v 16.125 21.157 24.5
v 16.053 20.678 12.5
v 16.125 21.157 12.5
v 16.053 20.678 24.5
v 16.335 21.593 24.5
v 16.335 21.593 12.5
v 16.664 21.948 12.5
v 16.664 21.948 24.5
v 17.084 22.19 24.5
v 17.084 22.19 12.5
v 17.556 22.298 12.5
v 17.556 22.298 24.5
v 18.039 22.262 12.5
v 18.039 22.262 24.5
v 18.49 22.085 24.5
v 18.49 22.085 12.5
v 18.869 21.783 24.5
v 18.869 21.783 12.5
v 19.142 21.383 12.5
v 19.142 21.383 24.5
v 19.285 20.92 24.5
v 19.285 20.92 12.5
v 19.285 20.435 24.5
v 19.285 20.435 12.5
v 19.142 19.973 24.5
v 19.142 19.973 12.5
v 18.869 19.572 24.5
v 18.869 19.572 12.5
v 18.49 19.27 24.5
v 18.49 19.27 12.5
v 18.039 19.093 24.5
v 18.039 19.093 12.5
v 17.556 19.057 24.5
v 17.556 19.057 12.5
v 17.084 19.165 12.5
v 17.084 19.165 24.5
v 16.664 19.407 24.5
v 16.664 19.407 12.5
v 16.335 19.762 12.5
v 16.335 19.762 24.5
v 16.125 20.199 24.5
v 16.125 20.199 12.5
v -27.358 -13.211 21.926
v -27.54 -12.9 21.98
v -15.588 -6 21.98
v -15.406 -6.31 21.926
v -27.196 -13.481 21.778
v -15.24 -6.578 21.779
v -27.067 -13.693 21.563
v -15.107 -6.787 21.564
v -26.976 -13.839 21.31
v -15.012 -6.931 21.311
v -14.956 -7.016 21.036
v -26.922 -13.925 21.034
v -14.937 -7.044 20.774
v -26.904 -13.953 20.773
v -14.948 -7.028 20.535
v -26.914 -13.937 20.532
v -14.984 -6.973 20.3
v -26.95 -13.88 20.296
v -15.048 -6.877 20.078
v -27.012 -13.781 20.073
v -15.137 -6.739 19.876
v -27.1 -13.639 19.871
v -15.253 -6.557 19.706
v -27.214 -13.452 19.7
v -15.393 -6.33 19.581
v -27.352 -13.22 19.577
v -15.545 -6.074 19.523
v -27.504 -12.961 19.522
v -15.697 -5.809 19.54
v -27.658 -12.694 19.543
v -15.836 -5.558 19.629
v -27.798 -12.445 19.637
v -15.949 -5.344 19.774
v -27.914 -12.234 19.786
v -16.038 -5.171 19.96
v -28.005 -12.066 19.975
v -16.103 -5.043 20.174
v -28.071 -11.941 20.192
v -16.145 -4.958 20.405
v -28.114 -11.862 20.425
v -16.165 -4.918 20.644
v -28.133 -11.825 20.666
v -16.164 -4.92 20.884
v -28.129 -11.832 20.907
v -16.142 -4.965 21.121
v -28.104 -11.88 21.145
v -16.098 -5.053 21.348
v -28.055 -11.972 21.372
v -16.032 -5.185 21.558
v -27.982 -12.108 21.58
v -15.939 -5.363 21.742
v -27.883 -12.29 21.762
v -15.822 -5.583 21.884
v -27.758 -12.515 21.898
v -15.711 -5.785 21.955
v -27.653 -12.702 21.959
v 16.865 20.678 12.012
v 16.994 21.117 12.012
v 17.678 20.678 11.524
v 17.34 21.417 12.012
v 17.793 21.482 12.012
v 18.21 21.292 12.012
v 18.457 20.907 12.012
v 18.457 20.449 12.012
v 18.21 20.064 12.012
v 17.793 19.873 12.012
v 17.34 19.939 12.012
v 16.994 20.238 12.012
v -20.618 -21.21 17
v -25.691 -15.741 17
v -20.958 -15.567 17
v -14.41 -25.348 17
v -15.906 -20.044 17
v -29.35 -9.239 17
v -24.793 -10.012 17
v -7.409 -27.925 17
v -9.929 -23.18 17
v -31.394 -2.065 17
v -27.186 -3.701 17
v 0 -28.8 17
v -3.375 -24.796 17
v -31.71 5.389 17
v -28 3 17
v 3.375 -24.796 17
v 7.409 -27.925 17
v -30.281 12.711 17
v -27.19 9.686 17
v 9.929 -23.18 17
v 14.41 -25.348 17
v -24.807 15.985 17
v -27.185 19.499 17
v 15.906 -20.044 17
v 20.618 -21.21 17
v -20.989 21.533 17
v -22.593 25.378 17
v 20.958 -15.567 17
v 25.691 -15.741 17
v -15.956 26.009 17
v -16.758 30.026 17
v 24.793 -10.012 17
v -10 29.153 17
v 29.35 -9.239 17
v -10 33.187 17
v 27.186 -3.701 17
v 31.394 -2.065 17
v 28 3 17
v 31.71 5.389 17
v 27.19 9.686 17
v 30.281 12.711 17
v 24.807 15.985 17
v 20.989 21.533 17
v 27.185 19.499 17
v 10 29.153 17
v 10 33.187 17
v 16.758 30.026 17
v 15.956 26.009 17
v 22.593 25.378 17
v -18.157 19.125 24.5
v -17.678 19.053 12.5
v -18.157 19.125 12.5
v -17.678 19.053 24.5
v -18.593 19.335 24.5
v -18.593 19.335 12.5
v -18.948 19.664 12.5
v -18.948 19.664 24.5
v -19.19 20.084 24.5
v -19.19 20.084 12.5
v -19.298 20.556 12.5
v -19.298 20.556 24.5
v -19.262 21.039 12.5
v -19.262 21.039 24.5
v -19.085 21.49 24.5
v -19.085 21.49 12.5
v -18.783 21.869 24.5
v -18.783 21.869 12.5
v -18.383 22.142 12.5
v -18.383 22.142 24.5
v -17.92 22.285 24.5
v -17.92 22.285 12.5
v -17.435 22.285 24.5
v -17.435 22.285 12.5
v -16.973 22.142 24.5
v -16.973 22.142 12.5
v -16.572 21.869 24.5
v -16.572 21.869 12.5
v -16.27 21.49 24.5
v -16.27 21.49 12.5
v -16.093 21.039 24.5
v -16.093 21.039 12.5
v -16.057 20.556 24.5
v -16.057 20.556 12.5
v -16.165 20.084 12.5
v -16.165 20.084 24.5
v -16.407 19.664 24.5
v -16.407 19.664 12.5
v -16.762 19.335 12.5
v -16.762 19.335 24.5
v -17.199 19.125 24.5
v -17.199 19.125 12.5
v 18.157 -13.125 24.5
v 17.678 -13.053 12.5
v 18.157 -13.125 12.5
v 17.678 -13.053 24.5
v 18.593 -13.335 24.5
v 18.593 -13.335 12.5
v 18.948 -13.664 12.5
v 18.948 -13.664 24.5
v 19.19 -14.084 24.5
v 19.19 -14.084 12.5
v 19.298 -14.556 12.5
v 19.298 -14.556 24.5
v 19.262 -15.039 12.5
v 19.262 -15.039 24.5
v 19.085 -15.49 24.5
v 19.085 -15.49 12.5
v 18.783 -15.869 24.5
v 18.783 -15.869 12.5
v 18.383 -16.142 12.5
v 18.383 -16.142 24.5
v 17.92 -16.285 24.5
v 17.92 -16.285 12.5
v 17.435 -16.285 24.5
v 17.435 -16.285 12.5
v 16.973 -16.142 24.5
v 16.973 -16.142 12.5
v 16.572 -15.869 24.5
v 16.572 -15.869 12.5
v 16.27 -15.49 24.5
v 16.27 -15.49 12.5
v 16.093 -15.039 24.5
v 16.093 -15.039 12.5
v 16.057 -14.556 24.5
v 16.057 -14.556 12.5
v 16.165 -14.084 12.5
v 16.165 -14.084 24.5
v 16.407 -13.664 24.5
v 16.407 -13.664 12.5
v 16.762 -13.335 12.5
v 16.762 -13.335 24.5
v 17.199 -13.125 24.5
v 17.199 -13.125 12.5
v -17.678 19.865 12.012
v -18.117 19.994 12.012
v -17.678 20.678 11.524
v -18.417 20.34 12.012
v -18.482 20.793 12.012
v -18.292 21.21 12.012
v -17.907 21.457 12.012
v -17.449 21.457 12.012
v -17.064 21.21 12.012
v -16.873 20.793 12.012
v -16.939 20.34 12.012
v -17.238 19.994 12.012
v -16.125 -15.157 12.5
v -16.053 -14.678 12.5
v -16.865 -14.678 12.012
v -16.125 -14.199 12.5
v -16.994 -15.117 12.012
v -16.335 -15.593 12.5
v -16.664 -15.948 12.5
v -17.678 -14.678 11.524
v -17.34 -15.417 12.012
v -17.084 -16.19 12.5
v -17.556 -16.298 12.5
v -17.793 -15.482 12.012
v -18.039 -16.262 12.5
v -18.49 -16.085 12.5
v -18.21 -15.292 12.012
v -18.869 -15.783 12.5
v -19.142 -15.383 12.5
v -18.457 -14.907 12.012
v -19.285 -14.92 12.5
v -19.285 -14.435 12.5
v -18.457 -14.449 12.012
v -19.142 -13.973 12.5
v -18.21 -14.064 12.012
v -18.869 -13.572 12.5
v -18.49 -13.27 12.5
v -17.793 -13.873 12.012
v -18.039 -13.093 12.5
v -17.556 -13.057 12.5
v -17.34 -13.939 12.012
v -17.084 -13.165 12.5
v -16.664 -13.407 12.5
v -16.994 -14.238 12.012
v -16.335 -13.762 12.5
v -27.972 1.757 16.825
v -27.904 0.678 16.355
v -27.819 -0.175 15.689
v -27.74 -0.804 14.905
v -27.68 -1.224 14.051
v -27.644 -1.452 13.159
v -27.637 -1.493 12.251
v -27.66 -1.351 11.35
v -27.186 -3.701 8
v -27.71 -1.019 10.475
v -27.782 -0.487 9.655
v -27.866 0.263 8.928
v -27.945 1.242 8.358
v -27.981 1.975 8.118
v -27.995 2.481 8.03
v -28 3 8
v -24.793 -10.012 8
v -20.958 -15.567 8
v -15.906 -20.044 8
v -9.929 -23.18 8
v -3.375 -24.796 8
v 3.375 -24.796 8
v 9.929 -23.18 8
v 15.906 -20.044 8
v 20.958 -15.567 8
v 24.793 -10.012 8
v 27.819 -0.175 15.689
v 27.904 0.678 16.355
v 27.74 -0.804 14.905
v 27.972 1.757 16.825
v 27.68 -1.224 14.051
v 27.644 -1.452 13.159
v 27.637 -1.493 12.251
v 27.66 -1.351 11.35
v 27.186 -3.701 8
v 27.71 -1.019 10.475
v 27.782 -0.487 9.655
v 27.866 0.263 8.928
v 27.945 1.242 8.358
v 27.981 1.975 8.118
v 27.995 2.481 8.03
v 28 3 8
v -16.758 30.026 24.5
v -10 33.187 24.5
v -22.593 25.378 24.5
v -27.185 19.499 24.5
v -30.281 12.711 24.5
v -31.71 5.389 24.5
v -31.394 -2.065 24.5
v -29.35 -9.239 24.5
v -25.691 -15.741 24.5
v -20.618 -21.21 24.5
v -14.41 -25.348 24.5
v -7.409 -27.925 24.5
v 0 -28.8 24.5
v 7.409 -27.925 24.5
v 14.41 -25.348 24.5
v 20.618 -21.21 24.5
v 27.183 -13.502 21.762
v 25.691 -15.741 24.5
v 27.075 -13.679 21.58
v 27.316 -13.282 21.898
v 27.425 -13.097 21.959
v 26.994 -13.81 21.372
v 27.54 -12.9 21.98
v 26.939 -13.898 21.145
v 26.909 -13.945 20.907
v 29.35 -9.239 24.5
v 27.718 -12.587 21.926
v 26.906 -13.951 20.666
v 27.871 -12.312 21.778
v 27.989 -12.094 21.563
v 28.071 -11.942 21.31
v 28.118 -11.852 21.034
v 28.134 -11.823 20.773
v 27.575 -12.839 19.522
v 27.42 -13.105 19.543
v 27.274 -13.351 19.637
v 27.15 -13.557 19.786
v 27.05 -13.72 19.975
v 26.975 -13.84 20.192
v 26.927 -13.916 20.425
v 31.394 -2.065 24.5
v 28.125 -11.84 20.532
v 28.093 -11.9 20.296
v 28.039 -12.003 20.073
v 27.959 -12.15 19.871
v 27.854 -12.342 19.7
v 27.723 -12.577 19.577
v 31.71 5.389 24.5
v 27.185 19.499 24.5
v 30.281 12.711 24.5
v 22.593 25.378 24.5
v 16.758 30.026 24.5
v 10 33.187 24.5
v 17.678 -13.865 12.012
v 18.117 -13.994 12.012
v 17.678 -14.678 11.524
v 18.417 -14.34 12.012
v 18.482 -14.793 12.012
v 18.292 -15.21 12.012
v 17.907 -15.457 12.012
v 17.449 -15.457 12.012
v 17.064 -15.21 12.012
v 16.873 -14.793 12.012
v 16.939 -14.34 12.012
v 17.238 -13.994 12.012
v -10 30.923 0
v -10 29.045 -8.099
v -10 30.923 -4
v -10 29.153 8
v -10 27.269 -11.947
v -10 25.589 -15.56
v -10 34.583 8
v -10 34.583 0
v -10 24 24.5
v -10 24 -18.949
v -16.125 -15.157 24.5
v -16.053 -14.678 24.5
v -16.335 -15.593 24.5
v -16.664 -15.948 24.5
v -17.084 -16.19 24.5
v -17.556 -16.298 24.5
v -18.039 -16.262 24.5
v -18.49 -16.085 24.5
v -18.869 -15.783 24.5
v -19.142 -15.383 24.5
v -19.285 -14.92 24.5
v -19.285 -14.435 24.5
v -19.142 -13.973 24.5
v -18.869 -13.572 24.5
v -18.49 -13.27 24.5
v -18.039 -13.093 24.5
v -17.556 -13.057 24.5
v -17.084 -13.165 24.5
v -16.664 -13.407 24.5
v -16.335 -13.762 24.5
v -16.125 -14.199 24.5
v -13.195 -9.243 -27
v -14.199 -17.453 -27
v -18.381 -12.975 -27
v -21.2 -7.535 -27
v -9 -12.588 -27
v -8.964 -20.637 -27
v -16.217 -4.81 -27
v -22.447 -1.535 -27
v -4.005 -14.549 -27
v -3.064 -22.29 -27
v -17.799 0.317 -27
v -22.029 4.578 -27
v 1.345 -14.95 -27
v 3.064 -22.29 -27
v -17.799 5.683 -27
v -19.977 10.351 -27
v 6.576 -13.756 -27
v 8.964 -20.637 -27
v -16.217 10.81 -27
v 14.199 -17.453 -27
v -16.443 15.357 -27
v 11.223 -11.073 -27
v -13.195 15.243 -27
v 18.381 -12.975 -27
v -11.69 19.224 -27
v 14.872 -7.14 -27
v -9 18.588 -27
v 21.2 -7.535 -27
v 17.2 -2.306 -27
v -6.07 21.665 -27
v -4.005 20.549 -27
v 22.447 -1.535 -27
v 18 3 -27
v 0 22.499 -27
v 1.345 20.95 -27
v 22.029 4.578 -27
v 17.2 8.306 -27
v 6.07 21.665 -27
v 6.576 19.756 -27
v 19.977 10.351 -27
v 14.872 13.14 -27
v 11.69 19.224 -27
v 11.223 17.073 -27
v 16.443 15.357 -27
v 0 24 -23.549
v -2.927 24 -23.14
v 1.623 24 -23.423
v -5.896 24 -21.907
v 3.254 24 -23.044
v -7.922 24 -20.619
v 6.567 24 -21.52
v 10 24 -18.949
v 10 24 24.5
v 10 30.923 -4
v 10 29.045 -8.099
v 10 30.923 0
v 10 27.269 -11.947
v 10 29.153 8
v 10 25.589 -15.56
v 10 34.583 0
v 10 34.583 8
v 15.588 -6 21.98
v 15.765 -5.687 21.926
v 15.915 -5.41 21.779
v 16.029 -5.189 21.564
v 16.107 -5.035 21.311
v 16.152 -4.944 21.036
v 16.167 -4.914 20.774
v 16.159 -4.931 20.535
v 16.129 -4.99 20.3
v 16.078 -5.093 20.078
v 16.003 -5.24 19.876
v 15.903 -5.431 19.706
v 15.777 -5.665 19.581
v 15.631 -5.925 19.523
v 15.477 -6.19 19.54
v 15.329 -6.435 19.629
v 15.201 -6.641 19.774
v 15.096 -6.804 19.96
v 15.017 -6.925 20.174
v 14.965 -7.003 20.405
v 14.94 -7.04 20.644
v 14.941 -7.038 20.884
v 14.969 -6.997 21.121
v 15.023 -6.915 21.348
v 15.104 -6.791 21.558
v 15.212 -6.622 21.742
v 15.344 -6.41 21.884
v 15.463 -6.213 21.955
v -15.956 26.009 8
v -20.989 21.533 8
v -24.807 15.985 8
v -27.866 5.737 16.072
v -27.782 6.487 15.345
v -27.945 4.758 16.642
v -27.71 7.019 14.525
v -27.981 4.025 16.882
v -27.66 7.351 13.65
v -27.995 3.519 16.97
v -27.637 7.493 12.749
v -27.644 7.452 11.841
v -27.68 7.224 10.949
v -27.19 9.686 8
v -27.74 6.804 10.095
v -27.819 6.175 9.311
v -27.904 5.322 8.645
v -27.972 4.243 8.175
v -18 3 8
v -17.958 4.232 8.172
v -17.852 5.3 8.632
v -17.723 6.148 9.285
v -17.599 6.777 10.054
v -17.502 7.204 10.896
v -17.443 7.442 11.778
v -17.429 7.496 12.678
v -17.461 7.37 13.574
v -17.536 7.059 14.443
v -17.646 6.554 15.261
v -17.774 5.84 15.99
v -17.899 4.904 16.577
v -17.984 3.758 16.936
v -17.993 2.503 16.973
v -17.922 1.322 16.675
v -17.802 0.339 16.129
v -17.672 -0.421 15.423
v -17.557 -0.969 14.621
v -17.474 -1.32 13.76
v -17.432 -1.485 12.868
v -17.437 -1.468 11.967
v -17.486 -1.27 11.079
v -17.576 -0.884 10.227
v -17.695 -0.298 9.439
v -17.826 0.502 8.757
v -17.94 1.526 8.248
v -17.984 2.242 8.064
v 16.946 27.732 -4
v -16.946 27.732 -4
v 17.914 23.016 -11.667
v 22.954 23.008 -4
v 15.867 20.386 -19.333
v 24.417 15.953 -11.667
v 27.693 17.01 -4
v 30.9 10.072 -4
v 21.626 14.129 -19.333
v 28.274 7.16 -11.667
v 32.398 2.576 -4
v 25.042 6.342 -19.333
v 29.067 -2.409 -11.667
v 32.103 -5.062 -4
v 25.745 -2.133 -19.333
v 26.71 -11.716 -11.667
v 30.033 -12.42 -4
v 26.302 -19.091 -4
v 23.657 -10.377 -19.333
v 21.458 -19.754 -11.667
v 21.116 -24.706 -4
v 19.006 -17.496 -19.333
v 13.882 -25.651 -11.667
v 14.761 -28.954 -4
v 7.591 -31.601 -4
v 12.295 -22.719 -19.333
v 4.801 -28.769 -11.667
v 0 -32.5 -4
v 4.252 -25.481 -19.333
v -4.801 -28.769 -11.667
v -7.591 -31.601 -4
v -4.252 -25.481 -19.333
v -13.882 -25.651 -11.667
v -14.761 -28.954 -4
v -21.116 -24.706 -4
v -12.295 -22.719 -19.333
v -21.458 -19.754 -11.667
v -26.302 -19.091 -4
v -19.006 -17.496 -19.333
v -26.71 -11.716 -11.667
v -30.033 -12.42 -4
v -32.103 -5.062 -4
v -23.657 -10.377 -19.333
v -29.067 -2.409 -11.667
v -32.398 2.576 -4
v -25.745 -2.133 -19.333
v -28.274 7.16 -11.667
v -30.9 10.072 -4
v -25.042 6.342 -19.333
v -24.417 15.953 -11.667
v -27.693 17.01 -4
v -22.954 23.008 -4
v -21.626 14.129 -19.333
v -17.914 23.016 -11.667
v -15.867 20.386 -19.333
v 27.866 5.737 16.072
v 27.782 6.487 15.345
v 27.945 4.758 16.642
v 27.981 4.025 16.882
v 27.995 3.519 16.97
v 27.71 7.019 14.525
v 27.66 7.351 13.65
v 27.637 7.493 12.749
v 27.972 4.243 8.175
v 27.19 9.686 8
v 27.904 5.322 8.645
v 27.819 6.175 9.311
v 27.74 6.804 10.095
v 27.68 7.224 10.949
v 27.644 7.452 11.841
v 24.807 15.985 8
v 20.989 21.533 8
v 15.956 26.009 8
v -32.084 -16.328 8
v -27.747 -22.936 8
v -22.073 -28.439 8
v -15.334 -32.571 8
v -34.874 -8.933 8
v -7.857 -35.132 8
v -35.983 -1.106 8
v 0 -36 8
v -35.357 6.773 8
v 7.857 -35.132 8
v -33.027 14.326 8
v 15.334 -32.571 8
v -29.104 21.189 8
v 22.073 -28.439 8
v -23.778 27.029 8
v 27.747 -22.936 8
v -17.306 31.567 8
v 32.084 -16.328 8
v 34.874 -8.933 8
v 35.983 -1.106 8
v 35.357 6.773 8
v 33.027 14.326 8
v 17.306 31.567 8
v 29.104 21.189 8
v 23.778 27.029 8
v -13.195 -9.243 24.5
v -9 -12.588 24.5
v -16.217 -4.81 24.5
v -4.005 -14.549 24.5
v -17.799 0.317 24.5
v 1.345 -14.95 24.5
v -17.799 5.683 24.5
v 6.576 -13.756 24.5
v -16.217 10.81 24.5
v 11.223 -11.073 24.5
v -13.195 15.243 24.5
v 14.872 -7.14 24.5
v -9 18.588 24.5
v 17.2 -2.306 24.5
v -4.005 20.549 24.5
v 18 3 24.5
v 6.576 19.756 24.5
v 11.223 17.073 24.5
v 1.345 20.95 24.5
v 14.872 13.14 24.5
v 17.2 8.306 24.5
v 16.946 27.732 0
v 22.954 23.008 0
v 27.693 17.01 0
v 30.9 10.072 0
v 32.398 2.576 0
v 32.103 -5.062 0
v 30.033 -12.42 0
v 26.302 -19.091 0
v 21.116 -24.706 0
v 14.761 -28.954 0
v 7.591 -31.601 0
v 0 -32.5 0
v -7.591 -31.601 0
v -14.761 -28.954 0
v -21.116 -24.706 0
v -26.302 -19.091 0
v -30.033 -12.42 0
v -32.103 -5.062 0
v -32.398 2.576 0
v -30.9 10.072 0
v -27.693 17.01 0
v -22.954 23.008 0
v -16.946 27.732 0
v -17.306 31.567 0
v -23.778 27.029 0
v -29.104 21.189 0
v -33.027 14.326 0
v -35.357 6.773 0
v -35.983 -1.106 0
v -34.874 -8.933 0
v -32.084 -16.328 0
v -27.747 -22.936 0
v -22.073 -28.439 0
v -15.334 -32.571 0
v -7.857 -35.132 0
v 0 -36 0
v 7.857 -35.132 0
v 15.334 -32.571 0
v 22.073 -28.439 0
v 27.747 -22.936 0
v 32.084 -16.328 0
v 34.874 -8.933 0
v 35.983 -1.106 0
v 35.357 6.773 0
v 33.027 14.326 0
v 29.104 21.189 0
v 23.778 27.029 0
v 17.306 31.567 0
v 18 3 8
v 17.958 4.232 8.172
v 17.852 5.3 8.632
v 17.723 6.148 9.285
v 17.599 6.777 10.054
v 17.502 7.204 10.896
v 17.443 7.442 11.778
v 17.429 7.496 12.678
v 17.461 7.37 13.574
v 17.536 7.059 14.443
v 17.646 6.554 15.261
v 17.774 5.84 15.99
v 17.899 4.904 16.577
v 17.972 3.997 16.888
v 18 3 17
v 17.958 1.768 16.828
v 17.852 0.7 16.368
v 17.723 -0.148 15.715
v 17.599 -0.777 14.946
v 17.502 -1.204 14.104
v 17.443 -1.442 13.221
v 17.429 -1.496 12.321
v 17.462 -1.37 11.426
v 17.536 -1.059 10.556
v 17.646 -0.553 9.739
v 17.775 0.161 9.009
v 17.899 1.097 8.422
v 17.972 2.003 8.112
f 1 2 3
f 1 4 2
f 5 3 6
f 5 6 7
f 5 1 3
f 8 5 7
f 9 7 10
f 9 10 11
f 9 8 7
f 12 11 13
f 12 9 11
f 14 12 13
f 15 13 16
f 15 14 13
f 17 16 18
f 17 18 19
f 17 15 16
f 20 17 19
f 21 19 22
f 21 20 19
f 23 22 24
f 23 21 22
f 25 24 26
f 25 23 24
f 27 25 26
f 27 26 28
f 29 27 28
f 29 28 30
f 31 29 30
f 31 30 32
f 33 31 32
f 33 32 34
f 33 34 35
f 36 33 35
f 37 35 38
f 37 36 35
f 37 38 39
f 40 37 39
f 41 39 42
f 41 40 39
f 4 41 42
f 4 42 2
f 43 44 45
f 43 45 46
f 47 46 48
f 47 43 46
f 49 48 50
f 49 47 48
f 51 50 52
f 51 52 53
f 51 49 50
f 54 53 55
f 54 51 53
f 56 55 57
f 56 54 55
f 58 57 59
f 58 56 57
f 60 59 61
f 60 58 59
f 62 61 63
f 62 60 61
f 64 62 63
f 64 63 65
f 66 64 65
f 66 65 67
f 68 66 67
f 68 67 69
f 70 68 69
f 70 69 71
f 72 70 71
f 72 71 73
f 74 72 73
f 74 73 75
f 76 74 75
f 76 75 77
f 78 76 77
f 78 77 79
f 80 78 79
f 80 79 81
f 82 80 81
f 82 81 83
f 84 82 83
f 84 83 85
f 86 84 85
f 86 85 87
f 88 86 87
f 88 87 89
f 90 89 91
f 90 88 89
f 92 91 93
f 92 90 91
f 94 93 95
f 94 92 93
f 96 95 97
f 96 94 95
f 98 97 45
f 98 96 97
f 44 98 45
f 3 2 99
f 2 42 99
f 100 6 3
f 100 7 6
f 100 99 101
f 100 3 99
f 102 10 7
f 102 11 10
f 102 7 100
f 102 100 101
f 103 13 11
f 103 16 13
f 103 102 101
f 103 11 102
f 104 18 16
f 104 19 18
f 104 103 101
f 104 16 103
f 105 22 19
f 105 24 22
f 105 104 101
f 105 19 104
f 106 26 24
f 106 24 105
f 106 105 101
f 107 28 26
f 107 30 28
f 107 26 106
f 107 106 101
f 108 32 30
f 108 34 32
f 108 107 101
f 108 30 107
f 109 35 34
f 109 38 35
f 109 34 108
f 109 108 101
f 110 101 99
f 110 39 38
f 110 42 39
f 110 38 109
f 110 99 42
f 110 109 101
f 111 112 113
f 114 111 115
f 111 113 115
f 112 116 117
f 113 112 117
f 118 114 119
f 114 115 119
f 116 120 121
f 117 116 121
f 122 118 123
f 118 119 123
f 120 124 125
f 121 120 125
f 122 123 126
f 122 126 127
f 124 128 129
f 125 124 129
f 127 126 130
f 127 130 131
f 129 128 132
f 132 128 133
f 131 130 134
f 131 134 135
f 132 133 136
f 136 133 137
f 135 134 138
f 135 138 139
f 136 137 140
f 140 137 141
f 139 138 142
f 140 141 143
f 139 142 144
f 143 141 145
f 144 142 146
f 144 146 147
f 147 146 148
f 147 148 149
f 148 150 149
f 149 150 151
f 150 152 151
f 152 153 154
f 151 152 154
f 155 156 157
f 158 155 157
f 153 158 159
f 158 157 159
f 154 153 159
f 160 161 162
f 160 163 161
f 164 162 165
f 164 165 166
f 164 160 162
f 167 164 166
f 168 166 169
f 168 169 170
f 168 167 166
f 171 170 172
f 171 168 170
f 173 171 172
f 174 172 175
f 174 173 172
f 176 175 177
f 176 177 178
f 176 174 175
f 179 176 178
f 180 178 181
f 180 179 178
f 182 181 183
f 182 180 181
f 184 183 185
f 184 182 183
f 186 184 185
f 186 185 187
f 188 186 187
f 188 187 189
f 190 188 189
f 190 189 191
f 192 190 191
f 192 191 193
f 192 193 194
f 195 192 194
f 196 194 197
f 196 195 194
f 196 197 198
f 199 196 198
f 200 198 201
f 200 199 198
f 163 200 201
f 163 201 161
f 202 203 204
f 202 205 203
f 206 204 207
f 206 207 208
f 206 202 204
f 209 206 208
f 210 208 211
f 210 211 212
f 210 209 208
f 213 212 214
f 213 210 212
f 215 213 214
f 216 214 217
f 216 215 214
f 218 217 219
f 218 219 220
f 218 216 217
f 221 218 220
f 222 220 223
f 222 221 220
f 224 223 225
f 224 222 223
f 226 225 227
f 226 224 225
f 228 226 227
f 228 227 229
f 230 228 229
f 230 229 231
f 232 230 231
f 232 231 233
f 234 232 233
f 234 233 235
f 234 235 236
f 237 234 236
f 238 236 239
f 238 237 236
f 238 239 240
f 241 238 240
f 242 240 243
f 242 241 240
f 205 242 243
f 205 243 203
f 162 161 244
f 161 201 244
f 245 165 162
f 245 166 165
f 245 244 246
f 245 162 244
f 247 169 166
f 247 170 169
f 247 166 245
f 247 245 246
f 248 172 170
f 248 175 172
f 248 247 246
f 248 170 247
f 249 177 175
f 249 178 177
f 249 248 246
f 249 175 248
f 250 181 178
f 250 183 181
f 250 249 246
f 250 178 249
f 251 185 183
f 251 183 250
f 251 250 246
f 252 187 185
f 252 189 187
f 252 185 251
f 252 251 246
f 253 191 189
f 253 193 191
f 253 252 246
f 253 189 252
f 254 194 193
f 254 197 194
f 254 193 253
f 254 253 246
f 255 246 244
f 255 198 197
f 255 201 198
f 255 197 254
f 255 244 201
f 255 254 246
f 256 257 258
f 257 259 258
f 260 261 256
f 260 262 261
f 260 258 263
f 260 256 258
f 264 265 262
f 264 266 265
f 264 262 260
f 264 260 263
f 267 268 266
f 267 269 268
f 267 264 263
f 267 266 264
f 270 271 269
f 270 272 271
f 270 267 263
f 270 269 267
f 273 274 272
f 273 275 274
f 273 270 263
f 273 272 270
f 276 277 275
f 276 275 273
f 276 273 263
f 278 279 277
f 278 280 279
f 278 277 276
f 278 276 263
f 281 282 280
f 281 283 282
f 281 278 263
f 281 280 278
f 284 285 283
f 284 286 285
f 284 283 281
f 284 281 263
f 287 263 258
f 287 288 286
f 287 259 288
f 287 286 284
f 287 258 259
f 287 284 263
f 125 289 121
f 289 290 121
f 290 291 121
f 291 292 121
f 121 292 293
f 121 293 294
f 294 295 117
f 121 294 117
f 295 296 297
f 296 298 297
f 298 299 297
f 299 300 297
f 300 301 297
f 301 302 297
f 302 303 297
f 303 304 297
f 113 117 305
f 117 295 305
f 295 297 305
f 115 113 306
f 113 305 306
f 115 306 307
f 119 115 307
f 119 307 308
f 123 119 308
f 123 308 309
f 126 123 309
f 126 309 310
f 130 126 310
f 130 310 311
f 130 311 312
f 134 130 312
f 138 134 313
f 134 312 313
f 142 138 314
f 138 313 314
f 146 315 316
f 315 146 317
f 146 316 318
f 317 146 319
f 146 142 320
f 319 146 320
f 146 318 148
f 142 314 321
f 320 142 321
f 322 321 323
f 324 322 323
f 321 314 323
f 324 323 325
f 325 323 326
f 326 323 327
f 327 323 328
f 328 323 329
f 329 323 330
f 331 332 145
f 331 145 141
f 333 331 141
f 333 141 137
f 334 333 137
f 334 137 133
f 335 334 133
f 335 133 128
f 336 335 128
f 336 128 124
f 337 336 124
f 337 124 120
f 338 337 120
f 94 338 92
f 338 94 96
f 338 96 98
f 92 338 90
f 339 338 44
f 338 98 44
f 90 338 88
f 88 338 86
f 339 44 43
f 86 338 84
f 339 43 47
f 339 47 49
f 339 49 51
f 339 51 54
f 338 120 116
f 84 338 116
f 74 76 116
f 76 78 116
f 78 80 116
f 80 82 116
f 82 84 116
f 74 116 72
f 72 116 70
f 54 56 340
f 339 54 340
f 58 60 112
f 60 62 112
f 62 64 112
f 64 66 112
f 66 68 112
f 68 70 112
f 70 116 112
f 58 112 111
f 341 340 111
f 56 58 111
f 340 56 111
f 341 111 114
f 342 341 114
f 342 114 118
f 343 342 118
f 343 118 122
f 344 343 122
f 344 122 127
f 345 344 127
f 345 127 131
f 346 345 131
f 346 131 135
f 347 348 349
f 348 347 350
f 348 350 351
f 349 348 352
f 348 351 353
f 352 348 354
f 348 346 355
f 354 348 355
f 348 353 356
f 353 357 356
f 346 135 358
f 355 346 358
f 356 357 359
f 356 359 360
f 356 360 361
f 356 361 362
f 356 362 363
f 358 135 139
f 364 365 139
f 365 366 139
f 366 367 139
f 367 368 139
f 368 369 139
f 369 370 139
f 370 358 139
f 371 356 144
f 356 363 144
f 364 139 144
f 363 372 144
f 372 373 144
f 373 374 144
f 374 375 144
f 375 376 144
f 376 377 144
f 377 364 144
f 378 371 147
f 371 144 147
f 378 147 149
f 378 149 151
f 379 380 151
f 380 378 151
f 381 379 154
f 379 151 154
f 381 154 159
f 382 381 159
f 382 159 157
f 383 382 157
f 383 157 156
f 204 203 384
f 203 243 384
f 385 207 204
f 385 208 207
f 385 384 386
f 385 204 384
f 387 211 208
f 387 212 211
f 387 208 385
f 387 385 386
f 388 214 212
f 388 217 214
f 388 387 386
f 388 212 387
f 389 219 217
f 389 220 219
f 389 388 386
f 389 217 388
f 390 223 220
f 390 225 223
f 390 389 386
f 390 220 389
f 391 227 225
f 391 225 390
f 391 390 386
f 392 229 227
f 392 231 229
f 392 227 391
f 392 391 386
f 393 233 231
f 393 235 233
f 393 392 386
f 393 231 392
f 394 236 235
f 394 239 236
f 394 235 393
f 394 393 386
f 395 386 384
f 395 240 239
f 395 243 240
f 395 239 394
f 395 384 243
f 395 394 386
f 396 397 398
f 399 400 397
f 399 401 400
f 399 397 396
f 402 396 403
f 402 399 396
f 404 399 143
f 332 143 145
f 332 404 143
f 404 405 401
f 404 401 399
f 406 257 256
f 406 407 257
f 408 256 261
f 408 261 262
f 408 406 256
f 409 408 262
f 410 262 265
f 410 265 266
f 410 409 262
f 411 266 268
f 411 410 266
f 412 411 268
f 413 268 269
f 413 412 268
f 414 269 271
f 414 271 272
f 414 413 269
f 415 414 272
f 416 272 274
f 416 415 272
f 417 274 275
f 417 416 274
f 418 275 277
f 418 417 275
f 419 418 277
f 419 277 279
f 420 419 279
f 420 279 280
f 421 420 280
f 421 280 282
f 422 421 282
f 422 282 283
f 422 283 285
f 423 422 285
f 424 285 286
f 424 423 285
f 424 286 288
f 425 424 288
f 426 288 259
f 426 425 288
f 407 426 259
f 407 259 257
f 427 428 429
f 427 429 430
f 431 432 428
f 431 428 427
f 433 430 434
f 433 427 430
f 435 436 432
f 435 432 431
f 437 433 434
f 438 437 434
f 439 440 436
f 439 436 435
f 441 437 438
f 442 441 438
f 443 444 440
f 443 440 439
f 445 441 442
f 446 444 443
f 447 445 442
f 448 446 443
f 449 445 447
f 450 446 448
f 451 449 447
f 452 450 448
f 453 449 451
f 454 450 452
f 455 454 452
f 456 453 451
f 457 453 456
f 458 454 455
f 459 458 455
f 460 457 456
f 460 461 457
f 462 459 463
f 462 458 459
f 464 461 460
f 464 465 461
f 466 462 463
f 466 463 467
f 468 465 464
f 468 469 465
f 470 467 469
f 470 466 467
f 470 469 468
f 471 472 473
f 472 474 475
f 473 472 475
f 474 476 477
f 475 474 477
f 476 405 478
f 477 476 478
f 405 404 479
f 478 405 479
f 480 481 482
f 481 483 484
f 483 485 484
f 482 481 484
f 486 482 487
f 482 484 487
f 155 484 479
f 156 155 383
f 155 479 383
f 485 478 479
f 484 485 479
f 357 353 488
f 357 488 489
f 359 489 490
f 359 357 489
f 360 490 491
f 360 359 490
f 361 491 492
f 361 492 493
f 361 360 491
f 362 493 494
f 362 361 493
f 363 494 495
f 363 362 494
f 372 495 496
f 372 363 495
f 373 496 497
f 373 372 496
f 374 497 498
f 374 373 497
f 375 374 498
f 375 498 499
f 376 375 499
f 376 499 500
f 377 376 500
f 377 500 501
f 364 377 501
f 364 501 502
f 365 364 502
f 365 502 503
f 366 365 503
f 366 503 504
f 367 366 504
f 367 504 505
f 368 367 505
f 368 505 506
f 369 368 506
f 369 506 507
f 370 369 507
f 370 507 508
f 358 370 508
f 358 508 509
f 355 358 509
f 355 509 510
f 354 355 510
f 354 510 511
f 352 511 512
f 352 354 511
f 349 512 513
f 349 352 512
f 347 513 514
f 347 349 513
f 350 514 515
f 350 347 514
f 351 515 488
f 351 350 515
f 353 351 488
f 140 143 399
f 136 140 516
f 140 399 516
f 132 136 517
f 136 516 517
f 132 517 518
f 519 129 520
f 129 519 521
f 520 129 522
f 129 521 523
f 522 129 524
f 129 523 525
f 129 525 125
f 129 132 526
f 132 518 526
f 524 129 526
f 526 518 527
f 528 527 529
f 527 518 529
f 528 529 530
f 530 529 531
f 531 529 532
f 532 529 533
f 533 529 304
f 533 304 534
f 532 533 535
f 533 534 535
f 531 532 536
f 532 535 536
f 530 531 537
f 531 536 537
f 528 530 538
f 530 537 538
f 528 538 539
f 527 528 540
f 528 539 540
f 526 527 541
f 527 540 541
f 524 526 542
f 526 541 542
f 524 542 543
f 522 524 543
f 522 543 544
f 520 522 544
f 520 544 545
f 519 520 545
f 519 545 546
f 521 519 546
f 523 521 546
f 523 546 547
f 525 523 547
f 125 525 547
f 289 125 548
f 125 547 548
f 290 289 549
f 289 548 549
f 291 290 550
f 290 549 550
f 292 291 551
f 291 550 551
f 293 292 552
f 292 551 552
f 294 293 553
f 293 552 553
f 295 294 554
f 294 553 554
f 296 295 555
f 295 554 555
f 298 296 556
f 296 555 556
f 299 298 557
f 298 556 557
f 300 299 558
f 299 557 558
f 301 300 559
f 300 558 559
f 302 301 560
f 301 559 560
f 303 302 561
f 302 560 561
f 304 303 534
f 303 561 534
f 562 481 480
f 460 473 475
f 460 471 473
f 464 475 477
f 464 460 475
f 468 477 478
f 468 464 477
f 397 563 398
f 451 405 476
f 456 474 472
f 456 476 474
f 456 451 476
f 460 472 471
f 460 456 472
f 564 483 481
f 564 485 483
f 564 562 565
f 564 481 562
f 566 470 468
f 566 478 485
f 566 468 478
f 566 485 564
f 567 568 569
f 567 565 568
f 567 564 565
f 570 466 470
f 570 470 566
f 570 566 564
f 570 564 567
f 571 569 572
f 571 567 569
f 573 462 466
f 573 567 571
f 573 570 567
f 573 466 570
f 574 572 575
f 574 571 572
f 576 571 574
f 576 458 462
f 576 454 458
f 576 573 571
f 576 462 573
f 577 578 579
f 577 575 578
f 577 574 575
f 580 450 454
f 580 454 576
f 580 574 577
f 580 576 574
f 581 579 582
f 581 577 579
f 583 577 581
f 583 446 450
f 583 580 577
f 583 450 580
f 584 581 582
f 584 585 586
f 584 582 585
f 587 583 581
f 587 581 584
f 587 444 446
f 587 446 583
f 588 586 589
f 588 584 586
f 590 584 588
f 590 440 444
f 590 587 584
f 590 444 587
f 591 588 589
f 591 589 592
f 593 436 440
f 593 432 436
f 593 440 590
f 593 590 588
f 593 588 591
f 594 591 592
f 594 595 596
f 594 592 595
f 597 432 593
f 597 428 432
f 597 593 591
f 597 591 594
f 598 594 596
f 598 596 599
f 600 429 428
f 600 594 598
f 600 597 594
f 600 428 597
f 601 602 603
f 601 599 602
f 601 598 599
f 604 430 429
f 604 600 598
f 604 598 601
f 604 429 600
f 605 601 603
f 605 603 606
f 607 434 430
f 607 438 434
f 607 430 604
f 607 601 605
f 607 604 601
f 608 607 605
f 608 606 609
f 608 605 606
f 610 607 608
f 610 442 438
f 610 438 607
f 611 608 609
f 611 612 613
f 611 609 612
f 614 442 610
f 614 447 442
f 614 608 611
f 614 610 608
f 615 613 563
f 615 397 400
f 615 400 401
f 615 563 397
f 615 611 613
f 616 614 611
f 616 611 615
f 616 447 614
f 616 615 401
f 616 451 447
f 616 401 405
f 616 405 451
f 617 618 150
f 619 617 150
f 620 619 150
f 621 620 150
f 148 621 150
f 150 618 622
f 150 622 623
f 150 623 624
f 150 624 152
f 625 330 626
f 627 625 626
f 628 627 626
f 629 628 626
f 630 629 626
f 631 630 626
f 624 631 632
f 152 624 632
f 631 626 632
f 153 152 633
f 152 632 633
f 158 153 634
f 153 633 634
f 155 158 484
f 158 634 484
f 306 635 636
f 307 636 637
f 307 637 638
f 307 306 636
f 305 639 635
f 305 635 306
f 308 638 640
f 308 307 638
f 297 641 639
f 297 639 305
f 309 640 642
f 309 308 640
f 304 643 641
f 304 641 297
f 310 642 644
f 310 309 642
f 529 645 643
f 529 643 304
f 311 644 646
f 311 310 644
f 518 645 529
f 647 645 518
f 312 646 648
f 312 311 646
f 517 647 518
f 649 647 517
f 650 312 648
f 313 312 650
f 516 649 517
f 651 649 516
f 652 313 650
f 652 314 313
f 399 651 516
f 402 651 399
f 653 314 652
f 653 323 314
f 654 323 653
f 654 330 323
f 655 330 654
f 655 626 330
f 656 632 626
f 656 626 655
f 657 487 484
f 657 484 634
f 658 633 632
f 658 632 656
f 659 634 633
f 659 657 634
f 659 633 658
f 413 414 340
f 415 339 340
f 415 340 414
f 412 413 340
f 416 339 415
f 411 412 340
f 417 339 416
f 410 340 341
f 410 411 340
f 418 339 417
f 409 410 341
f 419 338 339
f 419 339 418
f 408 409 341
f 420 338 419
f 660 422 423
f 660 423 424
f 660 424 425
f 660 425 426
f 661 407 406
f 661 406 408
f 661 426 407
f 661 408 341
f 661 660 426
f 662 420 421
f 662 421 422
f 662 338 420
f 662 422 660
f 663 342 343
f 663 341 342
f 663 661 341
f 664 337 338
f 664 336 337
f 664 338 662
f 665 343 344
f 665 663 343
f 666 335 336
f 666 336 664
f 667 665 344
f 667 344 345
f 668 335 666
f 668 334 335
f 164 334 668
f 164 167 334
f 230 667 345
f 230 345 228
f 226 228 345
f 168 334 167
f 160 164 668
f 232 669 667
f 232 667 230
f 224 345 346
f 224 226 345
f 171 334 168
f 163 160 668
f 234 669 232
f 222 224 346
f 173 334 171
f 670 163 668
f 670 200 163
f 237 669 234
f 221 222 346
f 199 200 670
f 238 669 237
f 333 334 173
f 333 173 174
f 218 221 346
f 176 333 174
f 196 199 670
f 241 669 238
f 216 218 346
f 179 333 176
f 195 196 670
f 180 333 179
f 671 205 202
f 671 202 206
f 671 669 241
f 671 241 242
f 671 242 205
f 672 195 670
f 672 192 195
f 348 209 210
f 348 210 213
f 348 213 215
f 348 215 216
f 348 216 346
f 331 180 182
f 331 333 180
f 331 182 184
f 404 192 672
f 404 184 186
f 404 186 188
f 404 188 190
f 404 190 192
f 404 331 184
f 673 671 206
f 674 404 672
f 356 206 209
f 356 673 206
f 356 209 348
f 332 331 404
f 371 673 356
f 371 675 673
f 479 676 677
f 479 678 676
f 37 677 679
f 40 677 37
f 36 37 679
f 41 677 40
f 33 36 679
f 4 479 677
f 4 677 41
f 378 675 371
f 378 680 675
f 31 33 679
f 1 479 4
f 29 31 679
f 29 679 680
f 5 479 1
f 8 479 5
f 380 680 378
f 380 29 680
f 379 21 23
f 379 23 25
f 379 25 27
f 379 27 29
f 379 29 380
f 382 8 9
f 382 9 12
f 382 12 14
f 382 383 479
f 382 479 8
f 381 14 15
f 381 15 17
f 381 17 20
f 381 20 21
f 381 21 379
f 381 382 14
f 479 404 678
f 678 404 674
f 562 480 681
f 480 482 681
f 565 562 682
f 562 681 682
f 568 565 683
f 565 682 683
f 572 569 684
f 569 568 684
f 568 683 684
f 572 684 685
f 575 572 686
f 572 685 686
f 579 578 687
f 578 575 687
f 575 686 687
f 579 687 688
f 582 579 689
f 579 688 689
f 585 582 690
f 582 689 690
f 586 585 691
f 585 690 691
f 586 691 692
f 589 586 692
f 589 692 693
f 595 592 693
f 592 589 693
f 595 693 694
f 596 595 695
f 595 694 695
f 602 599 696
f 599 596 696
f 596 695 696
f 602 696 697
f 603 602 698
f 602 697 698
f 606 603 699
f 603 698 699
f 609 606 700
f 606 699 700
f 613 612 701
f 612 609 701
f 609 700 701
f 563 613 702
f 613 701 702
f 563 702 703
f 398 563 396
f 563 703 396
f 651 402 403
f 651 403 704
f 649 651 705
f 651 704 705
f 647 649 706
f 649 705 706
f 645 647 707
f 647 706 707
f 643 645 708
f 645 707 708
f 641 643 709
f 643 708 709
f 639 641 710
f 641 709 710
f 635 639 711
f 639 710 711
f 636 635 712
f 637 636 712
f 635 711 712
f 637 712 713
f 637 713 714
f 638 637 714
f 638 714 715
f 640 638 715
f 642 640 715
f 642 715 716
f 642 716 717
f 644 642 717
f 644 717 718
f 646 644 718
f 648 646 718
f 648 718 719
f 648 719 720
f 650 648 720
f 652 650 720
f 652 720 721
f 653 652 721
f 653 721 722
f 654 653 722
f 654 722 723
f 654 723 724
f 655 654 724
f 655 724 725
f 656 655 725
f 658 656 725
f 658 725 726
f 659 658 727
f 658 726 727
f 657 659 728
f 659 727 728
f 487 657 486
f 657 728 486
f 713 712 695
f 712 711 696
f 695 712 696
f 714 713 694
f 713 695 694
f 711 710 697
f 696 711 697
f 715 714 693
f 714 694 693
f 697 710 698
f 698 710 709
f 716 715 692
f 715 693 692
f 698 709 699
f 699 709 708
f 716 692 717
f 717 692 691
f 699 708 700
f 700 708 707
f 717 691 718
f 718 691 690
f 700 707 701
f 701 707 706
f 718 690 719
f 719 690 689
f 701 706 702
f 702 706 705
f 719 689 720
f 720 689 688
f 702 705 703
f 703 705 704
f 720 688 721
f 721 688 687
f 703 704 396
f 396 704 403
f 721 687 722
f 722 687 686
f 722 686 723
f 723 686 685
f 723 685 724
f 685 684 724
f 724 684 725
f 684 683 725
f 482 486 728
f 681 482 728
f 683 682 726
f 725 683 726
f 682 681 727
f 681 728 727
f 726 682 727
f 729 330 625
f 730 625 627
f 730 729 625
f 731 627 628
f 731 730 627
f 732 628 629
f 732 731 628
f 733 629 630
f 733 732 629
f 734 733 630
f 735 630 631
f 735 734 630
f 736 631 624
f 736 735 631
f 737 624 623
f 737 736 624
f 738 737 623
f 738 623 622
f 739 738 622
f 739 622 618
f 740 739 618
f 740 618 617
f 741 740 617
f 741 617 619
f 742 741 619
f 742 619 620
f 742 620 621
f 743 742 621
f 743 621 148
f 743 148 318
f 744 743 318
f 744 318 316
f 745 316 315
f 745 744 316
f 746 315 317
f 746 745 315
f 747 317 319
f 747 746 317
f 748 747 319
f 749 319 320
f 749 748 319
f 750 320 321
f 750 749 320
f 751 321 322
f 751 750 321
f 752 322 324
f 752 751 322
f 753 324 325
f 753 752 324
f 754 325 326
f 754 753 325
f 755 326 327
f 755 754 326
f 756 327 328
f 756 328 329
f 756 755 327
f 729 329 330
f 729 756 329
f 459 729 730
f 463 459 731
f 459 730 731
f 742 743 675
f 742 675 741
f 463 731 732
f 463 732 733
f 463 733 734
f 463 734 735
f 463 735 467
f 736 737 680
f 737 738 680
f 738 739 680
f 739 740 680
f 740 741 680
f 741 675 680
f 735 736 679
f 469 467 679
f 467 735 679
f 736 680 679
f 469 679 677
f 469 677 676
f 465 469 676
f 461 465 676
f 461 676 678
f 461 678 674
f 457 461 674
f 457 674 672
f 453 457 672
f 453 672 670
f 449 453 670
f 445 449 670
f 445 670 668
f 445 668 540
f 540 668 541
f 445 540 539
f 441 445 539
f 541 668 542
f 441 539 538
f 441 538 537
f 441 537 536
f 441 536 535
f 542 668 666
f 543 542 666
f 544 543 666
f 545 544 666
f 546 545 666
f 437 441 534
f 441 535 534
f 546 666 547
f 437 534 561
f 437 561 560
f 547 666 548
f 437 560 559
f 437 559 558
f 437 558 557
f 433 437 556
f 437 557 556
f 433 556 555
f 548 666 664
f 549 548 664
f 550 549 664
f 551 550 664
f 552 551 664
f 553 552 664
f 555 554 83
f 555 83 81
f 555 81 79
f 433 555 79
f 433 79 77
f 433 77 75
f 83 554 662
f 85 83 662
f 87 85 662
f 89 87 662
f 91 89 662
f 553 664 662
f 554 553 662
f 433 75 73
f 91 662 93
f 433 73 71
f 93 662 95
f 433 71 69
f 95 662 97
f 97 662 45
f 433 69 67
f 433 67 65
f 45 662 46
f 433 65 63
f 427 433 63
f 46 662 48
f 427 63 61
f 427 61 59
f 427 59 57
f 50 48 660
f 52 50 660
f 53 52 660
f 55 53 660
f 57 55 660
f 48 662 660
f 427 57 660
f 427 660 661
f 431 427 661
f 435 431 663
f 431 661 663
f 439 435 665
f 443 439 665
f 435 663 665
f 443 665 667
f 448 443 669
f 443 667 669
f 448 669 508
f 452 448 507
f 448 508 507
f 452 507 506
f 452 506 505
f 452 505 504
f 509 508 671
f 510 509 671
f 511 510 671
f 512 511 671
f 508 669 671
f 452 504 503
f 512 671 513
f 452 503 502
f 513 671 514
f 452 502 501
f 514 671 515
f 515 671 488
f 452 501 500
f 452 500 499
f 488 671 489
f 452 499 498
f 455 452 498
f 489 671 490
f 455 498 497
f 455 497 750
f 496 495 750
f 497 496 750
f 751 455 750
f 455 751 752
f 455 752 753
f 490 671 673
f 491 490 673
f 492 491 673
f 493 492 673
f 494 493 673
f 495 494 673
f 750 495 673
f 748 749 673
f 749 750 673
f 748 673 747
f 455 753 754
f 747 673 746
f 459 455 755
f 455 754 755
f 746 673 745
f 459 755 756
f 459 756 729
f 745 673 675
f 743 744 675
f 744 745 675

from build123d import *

# Parameters (mm, degrees)
ESQUISSE1_R                  = 36
BASE_EXTRUSION_DEPTH         = 8
ESQUISSE2_R                  = 32.5
BOSS_EXTRU_1_DEPTH           = 4
ESQUISSE4_R                  = 28
BOSS_EXTRU_2_DEPTH           = 9
ESQUISSE5_R                  = 31.8
BOSS_EXTRU_3_DEPTH           = 7.5
ESQUISSE6_R                  = 18
ENL_V_MAT_EXTRU_1_DEPTH      = 52.5
ESQUISSE10_W                 = 20
ESQUISSE10_H                 = 14.61003861
ENL_V_MAT_EXTRU_5_DEPTH      = 52.5
R_P_TITION_CIRCULAIRE1_COUNT = 4
ESQUISSE13_R                 = 4.5
ENL_V_MAT_EXTRU_6_DEPTH      = 37
ENL_V_MAT_EXTRU_6_DEPTH_BACK = 37
ENL_V_START                  = -31.8
ESQUISSE14_R                 = 1.23
ENL_V_MAT_EXTRU_7_DEPTH      = 13.842074
R_P_TITION_CIRCULAIRE2_COUNT = 2
R_P_TITION_CIRCULAIRE2_ANGLE = 120


with BuildPart() as part:
    # Esquisse1 → Base-Extrusion (new body)
    with BuildSketch(Plane.XY):
        Circle(ESQUISSE1_R)
    extrude(amount=BASE_EXTRUSION_DEPTH)

    # Esquisse2 → Boss.-Extru.1 (add)
    with BuildSketch(Plane(origin=(0, 0, 0), x_dir=(-1, 0, 0), z_dir=(0, 0, -1))):
        Circle(ESQUISSE2_R)
    extrude(amount=BOSS_EXTRU_1_DEPTH)

    # Esquisse3 → Boss.-Révol.1 (revolve)
    with BuildSketch(Plane(origin=(0, 0, 0), x_dir=(0, 0, -1), z_dir=(1, 0, 0))):
        Polygon((4, 32.5), (27, 22.499315376), (27, 0), (4, 0), align=None)
    revolve(axis=Axis((0, 0, 0), (0, 0, -1)))

    # Esquisse4 → Boss.-Extru.2 (add)
    with BuildSketch(Plane.XY.offset(8)):
        with Locations((0, 3)):
            Circle(ESQUISSE4_R)
    extrude(amount=BOSS_EXTRU_2_DEPTH)

    # Esquisse5 → Boss.-Extru.3 (add)
    with BuildSketch(Plane.XY.offset(17)):
        with Locations((0, 3)):
            Circle(ESQUISSE5_R)
    extrude(amount=BOSS_EXTRU_3_DEPTH)

    # Esquisse6 → Enlèv. mat.-Extru.1 (cut, through all)
    with BuildSketch(Plane.XY.offset(24.5)):
        with Locations((0, 3)):
            Circle(ESQUISSE6_R)
    extrude(amount=-ENL_V_MAT_EXTRU_1_DEPTH, mode=Mode.SUBTRACT)

    # Esquisse10 → Enlèv. mat.-Extru.5 (cut, through all)
    with BuildSketch(Plane.XY.offset(24.5)):
        with Locations((0, 31.305019305)):
            Rectangle(ESQUISSE10_W, ESQUISSE10_H)
    extrude(amount=-ENL_V_MAT_EXTRU_5_DEPTH, mode=Mode.SUBTRACT)

    # Esquisse11 → Perçage1 (revolve, cut)
    with BuildSketch(Plane(origin=(-17.67766953, 20.67766953, 24.5), x_dir=(0, -1, 0), z_dir=(1, 0, 0))):
        Polygon((0, 0), (0, 12.976398506), (1.625, 12), (1.625, 0), align=None)
    per_age1 = revolve(axis=Axis((-17.67766953, 20.67766953, 28.744199587), (0, 0, -1)), mode=Mode.SUBTRACT)

    # Répétition circulaire1: Perçage1 ×4 about axis
    r_p_tition_circulaire1_axis = Axis((0, 3, 0), (0, 0, 1))
    for i in range(1, R_P_TITION_CIRCULAIRE1_COUNT):
        add(per_age1.rotate(r_p_tition_circulaire1_axis, i * 360 / R_P_TITION_CIRCULAIRE1_COUNT), mode=Mode.SUBTRACT)

    # Esquisse13 → Enlèv. mat.-Extru.6 (cut, two sides)
    with BuildSketch(Plane(origin=(0, 0, 0), x_dir=(0, 0, -1), z_dir=(1, 0, 0))) as enl_v_mat_extru_6_sk:
        with Locations((-12.5, 3)):
            Circle(ESQUISSE13_R)
    extrude(amount=ENL_V_MAT_EXTRU_6_DEPTH, mode=Mode.SUBTRACT)
    extrude(enl_v_mat_extru_6_sk.sketch, amount=-ENL_V_MAT_EXTRU_6_DEPTH_BACK, mode=Mode.SUBTRACT)

    # Esquisse14 → Enlèv. mat.-Extru.7 (cut)
    with BuildSketch(Plane(origin=(-1.299038106, 0.75, 0), x_dir=(0, 0, 1), z_dir=(-0.866025404, 0.5, 0)).offset(ENL_V_START)):
        with Locations((20.75, 2.598076211)):
            Circle(ESQUISSE14_R)
    enl_v_mat_extru_7 = extrude(amount=ENL_V_MAT_EXTRU_7_DEPTH, mode=Mode.SUBTRACT)

    # Répétition circulaire2: Enlèv. mat.-Extru.7 ×2 about axis
    r_p_tition_circulaire2_axis = Axis((0, 3, 0), (0, 0, -1))
    for i in range(1, R_P_TITION_CIRCULAIRE2_COUNT):
        add(enl_v_mat_extru_7.rotate(r_p_tition_circulaire2_axis, i * R_P_TITION_CIRCULAIRE2_ANGLE / (R_P_TITION_CIRCULAIRE2_COUNT - 1)), mode=Mode.SUBTRACT)


solid = part.part
